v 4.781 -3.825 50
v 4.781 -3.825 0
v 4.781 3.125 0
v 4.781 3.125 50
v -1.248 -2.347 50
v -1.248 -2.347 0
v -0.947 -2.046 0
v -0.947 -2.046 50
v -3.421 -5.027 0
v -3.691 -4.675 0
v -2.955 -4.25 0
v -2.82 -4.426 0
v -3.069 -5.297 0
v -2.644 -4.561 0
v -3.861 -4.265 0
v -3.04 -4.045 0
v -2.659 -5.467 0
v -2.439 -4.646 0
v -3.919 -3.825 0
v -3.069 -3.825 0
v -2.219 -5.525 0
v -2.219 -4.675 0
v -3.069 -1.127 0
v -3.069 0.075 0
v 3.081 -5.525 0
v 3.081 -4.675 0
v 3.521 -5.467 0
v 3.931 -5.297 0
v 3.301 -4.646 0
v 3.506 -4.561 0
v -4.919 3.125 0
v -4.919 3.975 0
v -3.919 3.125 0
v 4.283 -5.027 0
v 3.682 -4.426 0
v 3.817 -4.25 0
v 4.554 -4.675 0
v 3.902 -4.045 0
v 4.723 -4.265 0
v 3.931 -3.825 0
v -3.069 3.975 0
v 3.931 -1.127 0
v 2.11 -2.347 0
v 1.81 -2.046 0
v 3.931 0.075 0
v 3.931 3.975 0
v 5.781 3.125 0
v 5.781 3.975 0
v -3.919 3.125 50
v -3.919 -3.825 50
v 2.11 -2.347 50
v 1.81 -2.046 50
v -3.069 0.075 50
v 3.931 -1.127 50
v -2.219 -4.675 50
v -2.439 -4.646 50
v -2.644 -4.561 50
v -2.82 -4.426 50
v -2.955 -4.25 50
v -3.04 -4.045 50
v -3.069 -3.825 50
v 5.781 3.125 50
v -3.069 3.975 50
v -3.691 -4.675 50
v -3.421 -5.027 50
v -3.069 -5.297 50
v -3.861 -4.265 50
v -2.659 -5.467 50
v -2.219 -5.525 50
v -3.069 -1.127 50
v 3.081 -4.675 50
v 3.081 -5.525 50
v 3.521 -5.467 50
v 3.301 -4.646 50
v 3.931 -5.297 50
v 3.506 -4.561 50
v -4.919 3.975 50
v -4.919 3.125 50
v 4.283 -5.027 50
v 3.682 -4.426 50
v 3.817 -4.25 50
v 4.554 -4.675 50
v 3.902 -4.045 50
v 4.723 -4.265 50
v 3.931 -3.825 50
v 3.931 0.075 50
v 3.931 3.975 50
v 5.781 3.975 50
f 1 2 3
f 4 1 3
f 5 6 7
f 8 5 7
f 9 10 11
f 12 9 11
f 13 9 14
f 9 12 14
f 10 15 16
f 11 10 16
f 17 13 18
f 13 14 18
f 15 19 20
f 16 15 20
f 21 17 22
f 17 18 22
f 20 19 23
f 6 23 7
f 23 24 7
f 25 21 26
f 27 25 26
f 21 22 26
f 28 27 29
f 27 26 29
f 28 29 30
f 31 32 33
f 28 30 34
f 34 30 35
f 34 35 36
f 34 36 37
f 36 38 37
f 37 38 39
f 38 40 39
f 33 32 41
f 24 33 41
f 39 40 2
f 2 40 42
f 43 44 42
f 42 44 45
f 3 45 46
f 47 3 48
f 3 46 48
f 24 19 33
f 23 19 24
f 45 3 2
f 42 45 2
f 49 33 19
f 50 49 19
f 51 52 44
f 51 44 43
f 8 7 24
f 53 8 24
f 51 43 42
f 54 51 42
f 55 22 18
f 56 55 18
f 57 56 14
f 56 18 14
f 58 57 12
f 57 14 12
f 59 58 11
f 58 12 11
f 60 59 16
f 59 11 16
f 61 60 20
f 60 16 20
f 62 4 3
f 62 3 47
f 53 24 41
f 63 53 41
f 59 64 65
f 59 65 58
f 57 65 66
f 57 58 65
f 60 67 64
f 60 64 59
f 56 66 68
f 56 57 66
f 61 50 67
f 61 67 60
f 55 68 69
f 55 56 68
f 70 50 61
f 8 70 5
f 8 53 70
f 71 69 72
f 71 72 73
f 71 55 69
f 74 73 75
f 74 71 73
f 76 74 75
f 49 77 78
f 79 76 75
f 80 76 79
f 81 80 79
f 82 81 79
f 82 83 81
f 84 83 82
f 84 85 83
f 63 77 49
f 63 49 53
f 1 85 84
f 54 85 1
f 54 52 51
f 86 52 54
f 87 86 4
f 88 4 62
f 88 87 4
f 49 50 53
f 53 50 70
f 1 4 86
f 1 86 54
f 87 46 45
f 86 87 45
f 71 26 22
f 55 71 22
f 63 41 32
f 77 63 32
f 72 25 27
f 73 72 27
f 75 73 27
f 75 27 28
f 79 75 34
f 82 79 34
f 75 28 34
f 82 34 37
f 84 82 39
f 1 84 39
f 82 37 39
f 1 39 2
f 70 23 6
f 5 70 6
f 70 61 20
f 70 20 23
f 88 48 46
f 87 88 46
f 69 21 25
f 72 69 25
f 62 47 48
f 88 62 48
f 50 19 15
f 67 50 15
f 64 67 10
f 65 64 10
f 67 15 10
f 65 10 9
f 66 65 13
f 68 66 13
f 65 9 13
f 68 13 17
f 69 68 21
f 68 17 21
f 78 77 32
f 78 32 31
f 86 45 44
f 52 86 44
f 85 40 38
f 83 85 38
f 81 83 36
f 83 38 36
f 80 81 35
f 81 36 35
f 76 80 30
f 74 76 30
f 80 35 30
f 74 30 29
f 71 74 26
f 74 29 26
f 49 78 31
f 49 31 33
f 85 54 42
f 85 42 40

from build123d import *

# Parameters (mm, degrees)
EXTRUDE_1_DEPTH = 50


with BuildPart() as part:
    # 草图1 → 凸台-拉伸1 (new body)
    with BuildSketch(Plane.XY):
        with BuildLine():
            Line((-3.068719851, 0.075307347), (-3.068719851, 3.975307347))
            Line((-3.068719851, 3.975307347), (-4.918719851, 3.975307347))
            Line((-4.918719851, 3.975307347), (-4.918719851, 3.125307347))
            Line((-4.918719851, 3.125307347), (-3.918719851, 3.125307347))
            Line((-3.918719851, 3.125307347), (-3.918719851, -3.824692653))
            ThreePointArc((-3.918719851, -3.824692653), (-3.420801379, -5.026774181), (-2.218719851, -5.524692653))
            Line((-2.218719851, -5.524692653), (3.081280149, -5.524692653))
            ThreePointArc((3.081280149, -5.524692653), (4.283361677, -5.026774181), (4.781280149, -3.824692653))
            Line((4.781280149, -3.824692653), (4.781280149, 3.125307347))
            Line((4.781280149, 3.125307347), (5.781280149, 3.125307347))
            Line((5.781280149, 3.125307347), (5.781280149, 3.975307347))
            Line((5.781280149, 3.975307347), (3.931280149, 3.975307347))
            Line((3.931280149, 3.975307347), (3.931280149, 0.075307347))
            Line((3.931280149, 0.075307347), (1.809959806, -2.046012996))
            Line((1.809959806, -2.046012996), (2.110480188, -2.346533378))
            Line((2.110480188, -2.346533378), (3.931280149, -1.126774181))
            Line((3.931280149, -1.126774181), (3.931280149, -3.824692653))
            ThreePointArc((3.931280149, -3.824692653), (3.682320913, -4.425733417), (3.081280149, -4.674692653))
            Line((3.081280149, -4.674692653), (-2.218719851, -4.674692653))
            ThreePointArc((-2.218719851, -4.674692653), (-2.819760615, -4.425733417), (-3.068719851, -3.824692653))
            Line((-3.068719851, -3.824692653), (-3.068719851, -1.126774181))
            Line((-3.068719851, -1.126774181), (-1.247919889, -2.346533378))
            Line((-1.247919889, -2.346533378), (-0.947399507, -2.046012996))
            Line((-0.947399507, -2.046012996), (-3.068719851, 0.075307347))
        make_face()
    extrude(amount=EXTRUDE_1_DEPTH)


solid = part.part
